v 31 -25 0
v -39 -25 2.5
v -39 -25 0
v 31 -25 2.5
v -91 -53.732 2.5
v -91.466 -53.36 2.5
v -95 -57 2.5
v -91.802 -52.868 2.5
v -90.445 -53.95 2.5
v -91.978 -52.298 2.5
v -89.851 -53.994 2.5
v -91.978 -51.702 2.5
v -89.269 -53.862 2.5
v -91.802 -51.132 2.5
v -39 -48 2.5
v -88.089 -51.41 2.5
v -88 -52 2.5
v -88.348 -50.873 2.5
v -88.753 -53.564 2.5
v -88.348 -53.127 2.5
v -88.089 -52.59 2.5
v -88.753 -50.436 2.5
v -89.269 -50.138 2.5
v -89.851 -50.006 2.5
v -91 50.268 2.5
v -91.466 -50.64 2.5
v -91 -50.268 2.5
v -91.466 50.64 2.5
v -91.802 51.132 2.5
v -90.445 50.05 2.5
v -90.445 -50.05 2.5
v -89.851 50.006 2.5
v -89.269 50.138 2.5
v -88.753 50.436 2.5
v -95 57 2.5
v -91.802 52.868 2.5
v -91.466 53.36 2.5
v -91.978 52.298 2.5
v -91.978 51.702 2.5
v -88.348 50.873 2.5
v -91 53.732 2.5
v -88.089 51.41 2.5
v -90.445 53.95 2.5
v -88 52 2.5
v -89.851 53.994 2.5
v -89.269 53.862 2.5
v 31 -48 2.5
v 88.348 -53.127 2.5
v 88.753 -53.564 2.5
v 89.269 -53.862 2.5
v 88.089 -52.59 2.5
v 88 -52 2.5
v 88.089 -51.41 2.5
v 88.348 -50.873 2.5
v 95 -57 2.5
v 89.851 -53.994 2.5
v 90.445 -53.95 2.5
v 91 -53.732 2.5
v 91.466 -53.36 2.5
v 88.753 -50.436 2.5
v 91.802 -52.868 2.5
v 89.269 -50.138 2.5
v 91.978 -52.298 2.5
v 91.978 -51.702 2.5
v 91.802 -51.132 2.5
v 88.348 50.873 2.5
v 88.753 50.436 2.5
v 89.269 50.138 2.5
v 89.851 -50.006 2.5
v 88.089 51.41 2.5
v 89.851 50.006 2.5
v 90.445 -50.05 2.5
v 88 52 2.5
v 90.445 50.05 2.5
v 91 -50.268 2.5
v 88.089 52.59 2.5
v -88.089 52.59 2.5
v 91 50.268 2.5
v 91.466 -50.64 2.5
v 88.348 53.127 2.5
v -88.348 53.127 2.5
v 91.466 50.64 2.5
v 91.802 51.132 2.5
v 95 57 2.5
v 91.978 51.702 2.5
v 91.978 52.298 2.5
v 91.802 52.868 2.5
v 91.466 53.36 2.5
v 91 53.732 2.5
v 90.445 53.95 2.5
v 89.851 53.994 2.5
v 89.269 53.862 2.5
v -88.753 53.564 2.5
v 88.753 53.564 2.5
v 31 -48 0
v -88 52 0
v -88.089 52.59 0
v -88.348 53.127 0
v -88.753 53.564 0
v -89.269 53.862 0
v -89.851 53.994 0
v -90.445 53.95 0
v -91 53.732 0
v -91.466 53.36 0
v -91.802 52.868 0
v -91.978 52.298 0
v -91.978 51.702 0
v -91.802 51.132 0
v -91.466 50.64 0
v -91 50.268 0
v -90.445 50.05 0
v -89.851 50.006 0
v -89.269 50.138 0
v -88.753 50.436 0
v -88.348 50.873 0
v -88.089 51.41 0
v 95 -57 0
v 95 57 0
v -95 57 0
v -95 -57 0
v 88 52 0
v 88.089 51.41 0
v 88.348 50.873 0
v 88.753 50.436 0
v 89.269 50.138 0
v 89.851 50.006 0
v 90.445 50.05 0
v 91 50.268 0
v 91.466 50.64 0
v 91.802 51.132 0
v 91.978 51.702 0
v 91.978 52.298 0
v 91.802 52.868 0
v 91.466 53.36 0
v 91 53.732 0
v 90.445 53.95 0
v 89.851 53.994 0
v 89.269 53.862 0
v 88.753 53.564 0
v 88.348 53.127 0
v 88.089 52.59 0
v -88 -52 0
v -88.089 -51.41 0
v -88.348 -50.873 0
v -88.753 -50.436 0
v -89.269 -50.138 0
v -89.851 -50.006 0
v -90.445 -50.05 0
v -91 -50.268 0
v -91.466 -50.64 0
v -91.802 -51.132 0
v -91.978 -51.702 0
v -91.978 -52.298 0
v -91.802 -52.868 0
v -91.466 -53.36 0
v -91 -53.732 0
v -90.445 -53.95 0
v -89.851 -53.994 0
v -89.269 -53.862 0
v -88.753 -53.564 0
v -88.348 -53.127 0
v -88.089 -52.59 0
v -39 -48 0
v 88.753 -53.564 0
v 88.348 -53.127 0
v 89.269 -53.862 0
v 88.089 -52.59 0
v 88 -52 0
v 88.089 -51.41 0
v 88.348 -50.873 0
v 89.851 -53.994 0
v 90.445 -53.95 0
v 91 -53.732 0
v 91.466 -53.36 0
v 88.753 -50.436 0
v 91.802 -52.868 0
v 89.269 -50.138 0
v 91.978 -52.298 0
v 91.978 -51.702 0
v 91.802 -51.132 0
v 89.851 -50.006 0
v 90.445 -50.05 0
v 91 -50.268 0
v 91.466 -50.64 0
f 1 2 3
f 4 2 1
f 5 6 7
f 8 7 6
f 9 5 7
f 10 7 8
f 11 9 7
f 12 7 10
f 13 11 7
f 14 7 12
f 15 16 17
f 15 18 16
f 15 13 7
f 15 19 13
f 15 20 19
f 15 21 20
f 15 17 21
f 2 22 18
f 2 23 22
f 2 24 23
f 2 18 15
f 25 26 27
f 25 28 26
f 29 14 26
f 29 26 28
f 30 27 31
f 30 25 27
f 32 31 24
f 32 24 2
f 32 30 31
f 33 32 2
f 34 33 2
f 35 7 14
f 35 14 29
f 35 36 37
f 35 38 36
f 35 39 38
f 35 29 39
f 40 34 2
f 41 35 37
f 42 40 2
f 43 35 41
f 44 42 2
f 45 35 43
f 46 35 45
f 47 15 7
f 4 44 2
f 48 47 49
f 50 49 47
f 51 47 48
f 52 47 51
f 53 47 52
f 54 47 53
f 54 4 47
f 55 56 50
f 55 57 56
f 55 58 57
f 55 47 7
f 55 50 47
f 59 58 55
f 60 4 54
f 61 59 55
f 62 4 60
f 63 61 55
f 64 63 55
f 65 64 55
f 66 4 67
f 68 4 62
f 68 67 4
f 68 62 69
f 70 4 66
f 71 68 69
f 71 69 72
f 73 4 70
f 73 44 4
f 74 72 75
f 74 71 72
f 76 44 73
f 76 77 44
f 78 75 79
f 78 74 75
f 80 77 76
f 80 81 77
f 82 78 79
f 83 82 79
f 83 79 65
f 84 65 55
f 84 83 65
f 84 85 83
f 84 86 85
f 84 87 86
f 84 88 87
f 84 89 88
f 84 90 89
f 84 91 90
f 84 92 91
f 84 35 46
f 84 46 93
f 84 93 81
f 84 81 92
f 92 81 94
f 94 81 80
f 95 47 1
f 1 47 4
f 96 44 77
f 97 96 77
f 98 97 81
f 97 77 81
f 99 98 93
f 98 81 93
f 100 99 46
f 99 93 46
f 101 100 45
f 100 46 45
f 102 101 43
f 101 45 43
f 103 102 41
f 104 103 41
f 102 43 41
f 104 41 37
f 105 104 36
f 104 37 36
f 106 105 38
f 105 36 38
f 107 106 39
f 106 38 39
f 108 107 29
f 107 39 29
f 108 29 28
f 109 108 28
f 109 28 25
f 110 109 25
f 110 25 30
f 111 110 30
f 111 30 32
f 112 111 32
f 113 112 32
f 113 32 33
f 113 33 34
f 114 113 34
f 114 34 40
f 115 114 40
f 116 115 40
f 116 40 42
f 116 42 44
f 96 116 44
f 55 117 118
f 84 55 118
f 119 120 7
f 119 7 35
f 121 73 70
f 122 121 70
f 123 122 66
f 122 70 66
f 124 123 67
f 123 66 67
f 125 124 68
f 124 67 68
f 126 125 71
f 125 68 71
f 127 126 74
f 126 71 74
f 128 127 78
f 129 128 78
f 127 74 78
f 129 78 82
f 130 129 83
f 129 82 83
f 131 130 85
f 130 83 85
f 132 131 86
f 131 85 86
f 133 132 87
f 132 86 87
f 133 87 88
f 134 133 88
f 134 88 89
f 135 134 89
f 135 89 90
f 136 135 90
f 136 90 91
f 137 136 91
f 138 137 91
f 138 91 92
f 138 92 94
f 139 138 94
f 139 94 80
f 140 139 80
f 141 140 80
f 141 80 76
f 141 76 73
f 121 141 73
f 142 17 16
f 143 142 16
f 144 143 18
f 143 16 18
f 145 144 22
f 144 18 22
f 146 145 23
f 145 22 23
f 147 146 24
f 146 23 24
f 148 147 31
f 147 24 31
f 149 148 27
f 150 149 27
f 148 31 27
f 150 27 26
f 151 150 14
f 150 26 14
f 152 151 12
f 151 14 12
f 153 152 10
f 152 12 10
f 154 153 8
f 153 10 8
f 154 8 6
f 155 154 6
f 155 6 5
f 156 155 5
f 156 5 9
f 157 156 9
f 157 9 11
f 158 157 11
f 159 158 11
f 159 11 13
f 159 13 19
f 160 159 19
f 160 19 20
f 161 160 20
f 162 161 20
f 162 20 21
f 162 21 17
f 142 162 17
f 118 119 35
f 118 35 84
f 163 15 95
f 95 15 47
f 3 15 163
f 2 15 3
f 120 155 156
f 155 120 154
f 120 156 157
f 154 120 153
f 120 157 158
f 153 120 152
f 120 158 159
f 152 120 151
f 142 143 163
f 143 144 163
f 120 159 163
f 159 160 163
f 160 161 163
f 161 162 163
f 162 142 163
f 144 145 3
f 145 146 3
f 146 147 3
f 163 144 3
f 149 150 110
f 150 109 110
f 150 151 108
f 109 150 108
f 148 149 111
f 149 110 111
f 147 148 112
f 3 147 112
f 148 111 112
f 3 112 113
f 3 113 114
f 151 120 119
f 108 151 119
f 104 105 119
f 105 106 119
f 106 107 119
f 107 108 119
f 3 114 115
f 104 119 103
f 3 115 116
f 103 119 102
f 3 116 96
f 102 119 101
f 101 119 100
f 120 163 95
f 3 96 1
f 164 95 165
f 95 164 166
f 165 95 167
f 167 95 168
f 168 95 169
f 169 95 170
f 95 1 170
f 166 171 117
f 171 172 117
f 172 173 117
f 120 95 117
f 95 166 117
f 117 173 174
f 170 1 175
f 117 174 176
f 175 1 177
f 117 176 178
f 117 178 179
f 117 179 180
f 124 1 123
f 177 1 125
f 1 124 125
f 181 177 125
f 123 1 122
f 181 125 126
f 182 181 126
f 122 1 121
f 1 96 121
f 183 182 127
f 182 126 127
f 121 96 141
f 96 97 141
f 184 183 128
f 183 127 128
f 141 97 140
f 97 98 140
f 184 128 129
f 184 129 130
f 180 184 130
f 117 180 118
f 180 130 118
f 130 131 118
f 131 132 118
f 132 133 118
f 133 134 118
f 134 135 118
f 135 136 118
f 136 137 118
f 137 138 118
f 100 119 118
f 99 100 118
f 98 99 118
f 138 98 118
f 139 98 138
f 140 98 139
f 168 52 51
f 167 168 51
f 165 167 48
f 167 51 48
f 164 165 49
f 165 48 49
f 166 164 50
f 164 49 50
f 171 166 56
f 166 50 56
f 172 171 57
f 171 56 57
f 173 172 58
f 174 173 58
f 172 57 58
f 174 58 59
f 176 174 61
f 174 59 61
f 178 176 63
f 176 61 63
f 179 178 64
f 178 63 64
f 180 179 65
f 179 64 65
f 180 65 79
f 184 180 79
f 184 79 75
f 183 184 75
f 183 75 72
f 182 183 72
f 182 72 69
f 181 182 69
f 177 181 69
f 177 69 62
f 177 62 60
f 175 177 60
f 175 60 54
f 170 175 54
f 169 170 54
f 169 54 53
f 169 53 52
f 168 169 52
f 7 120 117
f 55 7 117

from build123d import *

# Parameters (mm, degrees)
SKETCH1_W           = 190
SKETCH1_H           = 114
BOSS_EXTRUDE1_DEPTH = 2.5
SKETCH3_W           = 70
SKETCH3_H           = 23
CUT_EXTRUDE2_DEPTH  = 10
SKETCH4_R           = 2
CUT_EXTRUDE3_DEPTH  = 10


with BuildPart() as part:
    # Sketch1 → Boss-Extrude1 (new body)
    with BuildSketch(Plane.XY):
        Rectangle(SKETCH1_W, SKETCH1_H)
    extrude(amount=BOSS_EXTRUDE1_DEPTH)

    # Sketch3 → Cut-Extrude2 (cut)
    with BuildSketch(Plane.XY.offset(2.5)):
        with Locations((-4, -36.5)):
            Rectangle(SKETCH3_W, SKETCH3_H)
    extrude(amount=-CUT_EXTRUDE2_DEPTH, mode=Mode.SUBTRACT)

    # Sketch4 → Cut-Extrude3 (cut)
    with BuildSketch(Plane.XY.offset(2.5)):
        with Locations((-90, 52)):
            Circle(SKETCH4_R)
        with Locations(Location((90, 52, 0), (0, 0, 180))):
            Circle(SKETCH4_R)
        with Locations((-90, -52)):
            Circle(SKETCH4_R)
        with Locations(Location((90, -52, 0), (0, 0, 180))):
            Circle(SKETCH4_R)
    extrude(amount=-CUT_EXTRUDE3_DEPTH, mode=Mode.SUBTRACT)


solid = part.part
